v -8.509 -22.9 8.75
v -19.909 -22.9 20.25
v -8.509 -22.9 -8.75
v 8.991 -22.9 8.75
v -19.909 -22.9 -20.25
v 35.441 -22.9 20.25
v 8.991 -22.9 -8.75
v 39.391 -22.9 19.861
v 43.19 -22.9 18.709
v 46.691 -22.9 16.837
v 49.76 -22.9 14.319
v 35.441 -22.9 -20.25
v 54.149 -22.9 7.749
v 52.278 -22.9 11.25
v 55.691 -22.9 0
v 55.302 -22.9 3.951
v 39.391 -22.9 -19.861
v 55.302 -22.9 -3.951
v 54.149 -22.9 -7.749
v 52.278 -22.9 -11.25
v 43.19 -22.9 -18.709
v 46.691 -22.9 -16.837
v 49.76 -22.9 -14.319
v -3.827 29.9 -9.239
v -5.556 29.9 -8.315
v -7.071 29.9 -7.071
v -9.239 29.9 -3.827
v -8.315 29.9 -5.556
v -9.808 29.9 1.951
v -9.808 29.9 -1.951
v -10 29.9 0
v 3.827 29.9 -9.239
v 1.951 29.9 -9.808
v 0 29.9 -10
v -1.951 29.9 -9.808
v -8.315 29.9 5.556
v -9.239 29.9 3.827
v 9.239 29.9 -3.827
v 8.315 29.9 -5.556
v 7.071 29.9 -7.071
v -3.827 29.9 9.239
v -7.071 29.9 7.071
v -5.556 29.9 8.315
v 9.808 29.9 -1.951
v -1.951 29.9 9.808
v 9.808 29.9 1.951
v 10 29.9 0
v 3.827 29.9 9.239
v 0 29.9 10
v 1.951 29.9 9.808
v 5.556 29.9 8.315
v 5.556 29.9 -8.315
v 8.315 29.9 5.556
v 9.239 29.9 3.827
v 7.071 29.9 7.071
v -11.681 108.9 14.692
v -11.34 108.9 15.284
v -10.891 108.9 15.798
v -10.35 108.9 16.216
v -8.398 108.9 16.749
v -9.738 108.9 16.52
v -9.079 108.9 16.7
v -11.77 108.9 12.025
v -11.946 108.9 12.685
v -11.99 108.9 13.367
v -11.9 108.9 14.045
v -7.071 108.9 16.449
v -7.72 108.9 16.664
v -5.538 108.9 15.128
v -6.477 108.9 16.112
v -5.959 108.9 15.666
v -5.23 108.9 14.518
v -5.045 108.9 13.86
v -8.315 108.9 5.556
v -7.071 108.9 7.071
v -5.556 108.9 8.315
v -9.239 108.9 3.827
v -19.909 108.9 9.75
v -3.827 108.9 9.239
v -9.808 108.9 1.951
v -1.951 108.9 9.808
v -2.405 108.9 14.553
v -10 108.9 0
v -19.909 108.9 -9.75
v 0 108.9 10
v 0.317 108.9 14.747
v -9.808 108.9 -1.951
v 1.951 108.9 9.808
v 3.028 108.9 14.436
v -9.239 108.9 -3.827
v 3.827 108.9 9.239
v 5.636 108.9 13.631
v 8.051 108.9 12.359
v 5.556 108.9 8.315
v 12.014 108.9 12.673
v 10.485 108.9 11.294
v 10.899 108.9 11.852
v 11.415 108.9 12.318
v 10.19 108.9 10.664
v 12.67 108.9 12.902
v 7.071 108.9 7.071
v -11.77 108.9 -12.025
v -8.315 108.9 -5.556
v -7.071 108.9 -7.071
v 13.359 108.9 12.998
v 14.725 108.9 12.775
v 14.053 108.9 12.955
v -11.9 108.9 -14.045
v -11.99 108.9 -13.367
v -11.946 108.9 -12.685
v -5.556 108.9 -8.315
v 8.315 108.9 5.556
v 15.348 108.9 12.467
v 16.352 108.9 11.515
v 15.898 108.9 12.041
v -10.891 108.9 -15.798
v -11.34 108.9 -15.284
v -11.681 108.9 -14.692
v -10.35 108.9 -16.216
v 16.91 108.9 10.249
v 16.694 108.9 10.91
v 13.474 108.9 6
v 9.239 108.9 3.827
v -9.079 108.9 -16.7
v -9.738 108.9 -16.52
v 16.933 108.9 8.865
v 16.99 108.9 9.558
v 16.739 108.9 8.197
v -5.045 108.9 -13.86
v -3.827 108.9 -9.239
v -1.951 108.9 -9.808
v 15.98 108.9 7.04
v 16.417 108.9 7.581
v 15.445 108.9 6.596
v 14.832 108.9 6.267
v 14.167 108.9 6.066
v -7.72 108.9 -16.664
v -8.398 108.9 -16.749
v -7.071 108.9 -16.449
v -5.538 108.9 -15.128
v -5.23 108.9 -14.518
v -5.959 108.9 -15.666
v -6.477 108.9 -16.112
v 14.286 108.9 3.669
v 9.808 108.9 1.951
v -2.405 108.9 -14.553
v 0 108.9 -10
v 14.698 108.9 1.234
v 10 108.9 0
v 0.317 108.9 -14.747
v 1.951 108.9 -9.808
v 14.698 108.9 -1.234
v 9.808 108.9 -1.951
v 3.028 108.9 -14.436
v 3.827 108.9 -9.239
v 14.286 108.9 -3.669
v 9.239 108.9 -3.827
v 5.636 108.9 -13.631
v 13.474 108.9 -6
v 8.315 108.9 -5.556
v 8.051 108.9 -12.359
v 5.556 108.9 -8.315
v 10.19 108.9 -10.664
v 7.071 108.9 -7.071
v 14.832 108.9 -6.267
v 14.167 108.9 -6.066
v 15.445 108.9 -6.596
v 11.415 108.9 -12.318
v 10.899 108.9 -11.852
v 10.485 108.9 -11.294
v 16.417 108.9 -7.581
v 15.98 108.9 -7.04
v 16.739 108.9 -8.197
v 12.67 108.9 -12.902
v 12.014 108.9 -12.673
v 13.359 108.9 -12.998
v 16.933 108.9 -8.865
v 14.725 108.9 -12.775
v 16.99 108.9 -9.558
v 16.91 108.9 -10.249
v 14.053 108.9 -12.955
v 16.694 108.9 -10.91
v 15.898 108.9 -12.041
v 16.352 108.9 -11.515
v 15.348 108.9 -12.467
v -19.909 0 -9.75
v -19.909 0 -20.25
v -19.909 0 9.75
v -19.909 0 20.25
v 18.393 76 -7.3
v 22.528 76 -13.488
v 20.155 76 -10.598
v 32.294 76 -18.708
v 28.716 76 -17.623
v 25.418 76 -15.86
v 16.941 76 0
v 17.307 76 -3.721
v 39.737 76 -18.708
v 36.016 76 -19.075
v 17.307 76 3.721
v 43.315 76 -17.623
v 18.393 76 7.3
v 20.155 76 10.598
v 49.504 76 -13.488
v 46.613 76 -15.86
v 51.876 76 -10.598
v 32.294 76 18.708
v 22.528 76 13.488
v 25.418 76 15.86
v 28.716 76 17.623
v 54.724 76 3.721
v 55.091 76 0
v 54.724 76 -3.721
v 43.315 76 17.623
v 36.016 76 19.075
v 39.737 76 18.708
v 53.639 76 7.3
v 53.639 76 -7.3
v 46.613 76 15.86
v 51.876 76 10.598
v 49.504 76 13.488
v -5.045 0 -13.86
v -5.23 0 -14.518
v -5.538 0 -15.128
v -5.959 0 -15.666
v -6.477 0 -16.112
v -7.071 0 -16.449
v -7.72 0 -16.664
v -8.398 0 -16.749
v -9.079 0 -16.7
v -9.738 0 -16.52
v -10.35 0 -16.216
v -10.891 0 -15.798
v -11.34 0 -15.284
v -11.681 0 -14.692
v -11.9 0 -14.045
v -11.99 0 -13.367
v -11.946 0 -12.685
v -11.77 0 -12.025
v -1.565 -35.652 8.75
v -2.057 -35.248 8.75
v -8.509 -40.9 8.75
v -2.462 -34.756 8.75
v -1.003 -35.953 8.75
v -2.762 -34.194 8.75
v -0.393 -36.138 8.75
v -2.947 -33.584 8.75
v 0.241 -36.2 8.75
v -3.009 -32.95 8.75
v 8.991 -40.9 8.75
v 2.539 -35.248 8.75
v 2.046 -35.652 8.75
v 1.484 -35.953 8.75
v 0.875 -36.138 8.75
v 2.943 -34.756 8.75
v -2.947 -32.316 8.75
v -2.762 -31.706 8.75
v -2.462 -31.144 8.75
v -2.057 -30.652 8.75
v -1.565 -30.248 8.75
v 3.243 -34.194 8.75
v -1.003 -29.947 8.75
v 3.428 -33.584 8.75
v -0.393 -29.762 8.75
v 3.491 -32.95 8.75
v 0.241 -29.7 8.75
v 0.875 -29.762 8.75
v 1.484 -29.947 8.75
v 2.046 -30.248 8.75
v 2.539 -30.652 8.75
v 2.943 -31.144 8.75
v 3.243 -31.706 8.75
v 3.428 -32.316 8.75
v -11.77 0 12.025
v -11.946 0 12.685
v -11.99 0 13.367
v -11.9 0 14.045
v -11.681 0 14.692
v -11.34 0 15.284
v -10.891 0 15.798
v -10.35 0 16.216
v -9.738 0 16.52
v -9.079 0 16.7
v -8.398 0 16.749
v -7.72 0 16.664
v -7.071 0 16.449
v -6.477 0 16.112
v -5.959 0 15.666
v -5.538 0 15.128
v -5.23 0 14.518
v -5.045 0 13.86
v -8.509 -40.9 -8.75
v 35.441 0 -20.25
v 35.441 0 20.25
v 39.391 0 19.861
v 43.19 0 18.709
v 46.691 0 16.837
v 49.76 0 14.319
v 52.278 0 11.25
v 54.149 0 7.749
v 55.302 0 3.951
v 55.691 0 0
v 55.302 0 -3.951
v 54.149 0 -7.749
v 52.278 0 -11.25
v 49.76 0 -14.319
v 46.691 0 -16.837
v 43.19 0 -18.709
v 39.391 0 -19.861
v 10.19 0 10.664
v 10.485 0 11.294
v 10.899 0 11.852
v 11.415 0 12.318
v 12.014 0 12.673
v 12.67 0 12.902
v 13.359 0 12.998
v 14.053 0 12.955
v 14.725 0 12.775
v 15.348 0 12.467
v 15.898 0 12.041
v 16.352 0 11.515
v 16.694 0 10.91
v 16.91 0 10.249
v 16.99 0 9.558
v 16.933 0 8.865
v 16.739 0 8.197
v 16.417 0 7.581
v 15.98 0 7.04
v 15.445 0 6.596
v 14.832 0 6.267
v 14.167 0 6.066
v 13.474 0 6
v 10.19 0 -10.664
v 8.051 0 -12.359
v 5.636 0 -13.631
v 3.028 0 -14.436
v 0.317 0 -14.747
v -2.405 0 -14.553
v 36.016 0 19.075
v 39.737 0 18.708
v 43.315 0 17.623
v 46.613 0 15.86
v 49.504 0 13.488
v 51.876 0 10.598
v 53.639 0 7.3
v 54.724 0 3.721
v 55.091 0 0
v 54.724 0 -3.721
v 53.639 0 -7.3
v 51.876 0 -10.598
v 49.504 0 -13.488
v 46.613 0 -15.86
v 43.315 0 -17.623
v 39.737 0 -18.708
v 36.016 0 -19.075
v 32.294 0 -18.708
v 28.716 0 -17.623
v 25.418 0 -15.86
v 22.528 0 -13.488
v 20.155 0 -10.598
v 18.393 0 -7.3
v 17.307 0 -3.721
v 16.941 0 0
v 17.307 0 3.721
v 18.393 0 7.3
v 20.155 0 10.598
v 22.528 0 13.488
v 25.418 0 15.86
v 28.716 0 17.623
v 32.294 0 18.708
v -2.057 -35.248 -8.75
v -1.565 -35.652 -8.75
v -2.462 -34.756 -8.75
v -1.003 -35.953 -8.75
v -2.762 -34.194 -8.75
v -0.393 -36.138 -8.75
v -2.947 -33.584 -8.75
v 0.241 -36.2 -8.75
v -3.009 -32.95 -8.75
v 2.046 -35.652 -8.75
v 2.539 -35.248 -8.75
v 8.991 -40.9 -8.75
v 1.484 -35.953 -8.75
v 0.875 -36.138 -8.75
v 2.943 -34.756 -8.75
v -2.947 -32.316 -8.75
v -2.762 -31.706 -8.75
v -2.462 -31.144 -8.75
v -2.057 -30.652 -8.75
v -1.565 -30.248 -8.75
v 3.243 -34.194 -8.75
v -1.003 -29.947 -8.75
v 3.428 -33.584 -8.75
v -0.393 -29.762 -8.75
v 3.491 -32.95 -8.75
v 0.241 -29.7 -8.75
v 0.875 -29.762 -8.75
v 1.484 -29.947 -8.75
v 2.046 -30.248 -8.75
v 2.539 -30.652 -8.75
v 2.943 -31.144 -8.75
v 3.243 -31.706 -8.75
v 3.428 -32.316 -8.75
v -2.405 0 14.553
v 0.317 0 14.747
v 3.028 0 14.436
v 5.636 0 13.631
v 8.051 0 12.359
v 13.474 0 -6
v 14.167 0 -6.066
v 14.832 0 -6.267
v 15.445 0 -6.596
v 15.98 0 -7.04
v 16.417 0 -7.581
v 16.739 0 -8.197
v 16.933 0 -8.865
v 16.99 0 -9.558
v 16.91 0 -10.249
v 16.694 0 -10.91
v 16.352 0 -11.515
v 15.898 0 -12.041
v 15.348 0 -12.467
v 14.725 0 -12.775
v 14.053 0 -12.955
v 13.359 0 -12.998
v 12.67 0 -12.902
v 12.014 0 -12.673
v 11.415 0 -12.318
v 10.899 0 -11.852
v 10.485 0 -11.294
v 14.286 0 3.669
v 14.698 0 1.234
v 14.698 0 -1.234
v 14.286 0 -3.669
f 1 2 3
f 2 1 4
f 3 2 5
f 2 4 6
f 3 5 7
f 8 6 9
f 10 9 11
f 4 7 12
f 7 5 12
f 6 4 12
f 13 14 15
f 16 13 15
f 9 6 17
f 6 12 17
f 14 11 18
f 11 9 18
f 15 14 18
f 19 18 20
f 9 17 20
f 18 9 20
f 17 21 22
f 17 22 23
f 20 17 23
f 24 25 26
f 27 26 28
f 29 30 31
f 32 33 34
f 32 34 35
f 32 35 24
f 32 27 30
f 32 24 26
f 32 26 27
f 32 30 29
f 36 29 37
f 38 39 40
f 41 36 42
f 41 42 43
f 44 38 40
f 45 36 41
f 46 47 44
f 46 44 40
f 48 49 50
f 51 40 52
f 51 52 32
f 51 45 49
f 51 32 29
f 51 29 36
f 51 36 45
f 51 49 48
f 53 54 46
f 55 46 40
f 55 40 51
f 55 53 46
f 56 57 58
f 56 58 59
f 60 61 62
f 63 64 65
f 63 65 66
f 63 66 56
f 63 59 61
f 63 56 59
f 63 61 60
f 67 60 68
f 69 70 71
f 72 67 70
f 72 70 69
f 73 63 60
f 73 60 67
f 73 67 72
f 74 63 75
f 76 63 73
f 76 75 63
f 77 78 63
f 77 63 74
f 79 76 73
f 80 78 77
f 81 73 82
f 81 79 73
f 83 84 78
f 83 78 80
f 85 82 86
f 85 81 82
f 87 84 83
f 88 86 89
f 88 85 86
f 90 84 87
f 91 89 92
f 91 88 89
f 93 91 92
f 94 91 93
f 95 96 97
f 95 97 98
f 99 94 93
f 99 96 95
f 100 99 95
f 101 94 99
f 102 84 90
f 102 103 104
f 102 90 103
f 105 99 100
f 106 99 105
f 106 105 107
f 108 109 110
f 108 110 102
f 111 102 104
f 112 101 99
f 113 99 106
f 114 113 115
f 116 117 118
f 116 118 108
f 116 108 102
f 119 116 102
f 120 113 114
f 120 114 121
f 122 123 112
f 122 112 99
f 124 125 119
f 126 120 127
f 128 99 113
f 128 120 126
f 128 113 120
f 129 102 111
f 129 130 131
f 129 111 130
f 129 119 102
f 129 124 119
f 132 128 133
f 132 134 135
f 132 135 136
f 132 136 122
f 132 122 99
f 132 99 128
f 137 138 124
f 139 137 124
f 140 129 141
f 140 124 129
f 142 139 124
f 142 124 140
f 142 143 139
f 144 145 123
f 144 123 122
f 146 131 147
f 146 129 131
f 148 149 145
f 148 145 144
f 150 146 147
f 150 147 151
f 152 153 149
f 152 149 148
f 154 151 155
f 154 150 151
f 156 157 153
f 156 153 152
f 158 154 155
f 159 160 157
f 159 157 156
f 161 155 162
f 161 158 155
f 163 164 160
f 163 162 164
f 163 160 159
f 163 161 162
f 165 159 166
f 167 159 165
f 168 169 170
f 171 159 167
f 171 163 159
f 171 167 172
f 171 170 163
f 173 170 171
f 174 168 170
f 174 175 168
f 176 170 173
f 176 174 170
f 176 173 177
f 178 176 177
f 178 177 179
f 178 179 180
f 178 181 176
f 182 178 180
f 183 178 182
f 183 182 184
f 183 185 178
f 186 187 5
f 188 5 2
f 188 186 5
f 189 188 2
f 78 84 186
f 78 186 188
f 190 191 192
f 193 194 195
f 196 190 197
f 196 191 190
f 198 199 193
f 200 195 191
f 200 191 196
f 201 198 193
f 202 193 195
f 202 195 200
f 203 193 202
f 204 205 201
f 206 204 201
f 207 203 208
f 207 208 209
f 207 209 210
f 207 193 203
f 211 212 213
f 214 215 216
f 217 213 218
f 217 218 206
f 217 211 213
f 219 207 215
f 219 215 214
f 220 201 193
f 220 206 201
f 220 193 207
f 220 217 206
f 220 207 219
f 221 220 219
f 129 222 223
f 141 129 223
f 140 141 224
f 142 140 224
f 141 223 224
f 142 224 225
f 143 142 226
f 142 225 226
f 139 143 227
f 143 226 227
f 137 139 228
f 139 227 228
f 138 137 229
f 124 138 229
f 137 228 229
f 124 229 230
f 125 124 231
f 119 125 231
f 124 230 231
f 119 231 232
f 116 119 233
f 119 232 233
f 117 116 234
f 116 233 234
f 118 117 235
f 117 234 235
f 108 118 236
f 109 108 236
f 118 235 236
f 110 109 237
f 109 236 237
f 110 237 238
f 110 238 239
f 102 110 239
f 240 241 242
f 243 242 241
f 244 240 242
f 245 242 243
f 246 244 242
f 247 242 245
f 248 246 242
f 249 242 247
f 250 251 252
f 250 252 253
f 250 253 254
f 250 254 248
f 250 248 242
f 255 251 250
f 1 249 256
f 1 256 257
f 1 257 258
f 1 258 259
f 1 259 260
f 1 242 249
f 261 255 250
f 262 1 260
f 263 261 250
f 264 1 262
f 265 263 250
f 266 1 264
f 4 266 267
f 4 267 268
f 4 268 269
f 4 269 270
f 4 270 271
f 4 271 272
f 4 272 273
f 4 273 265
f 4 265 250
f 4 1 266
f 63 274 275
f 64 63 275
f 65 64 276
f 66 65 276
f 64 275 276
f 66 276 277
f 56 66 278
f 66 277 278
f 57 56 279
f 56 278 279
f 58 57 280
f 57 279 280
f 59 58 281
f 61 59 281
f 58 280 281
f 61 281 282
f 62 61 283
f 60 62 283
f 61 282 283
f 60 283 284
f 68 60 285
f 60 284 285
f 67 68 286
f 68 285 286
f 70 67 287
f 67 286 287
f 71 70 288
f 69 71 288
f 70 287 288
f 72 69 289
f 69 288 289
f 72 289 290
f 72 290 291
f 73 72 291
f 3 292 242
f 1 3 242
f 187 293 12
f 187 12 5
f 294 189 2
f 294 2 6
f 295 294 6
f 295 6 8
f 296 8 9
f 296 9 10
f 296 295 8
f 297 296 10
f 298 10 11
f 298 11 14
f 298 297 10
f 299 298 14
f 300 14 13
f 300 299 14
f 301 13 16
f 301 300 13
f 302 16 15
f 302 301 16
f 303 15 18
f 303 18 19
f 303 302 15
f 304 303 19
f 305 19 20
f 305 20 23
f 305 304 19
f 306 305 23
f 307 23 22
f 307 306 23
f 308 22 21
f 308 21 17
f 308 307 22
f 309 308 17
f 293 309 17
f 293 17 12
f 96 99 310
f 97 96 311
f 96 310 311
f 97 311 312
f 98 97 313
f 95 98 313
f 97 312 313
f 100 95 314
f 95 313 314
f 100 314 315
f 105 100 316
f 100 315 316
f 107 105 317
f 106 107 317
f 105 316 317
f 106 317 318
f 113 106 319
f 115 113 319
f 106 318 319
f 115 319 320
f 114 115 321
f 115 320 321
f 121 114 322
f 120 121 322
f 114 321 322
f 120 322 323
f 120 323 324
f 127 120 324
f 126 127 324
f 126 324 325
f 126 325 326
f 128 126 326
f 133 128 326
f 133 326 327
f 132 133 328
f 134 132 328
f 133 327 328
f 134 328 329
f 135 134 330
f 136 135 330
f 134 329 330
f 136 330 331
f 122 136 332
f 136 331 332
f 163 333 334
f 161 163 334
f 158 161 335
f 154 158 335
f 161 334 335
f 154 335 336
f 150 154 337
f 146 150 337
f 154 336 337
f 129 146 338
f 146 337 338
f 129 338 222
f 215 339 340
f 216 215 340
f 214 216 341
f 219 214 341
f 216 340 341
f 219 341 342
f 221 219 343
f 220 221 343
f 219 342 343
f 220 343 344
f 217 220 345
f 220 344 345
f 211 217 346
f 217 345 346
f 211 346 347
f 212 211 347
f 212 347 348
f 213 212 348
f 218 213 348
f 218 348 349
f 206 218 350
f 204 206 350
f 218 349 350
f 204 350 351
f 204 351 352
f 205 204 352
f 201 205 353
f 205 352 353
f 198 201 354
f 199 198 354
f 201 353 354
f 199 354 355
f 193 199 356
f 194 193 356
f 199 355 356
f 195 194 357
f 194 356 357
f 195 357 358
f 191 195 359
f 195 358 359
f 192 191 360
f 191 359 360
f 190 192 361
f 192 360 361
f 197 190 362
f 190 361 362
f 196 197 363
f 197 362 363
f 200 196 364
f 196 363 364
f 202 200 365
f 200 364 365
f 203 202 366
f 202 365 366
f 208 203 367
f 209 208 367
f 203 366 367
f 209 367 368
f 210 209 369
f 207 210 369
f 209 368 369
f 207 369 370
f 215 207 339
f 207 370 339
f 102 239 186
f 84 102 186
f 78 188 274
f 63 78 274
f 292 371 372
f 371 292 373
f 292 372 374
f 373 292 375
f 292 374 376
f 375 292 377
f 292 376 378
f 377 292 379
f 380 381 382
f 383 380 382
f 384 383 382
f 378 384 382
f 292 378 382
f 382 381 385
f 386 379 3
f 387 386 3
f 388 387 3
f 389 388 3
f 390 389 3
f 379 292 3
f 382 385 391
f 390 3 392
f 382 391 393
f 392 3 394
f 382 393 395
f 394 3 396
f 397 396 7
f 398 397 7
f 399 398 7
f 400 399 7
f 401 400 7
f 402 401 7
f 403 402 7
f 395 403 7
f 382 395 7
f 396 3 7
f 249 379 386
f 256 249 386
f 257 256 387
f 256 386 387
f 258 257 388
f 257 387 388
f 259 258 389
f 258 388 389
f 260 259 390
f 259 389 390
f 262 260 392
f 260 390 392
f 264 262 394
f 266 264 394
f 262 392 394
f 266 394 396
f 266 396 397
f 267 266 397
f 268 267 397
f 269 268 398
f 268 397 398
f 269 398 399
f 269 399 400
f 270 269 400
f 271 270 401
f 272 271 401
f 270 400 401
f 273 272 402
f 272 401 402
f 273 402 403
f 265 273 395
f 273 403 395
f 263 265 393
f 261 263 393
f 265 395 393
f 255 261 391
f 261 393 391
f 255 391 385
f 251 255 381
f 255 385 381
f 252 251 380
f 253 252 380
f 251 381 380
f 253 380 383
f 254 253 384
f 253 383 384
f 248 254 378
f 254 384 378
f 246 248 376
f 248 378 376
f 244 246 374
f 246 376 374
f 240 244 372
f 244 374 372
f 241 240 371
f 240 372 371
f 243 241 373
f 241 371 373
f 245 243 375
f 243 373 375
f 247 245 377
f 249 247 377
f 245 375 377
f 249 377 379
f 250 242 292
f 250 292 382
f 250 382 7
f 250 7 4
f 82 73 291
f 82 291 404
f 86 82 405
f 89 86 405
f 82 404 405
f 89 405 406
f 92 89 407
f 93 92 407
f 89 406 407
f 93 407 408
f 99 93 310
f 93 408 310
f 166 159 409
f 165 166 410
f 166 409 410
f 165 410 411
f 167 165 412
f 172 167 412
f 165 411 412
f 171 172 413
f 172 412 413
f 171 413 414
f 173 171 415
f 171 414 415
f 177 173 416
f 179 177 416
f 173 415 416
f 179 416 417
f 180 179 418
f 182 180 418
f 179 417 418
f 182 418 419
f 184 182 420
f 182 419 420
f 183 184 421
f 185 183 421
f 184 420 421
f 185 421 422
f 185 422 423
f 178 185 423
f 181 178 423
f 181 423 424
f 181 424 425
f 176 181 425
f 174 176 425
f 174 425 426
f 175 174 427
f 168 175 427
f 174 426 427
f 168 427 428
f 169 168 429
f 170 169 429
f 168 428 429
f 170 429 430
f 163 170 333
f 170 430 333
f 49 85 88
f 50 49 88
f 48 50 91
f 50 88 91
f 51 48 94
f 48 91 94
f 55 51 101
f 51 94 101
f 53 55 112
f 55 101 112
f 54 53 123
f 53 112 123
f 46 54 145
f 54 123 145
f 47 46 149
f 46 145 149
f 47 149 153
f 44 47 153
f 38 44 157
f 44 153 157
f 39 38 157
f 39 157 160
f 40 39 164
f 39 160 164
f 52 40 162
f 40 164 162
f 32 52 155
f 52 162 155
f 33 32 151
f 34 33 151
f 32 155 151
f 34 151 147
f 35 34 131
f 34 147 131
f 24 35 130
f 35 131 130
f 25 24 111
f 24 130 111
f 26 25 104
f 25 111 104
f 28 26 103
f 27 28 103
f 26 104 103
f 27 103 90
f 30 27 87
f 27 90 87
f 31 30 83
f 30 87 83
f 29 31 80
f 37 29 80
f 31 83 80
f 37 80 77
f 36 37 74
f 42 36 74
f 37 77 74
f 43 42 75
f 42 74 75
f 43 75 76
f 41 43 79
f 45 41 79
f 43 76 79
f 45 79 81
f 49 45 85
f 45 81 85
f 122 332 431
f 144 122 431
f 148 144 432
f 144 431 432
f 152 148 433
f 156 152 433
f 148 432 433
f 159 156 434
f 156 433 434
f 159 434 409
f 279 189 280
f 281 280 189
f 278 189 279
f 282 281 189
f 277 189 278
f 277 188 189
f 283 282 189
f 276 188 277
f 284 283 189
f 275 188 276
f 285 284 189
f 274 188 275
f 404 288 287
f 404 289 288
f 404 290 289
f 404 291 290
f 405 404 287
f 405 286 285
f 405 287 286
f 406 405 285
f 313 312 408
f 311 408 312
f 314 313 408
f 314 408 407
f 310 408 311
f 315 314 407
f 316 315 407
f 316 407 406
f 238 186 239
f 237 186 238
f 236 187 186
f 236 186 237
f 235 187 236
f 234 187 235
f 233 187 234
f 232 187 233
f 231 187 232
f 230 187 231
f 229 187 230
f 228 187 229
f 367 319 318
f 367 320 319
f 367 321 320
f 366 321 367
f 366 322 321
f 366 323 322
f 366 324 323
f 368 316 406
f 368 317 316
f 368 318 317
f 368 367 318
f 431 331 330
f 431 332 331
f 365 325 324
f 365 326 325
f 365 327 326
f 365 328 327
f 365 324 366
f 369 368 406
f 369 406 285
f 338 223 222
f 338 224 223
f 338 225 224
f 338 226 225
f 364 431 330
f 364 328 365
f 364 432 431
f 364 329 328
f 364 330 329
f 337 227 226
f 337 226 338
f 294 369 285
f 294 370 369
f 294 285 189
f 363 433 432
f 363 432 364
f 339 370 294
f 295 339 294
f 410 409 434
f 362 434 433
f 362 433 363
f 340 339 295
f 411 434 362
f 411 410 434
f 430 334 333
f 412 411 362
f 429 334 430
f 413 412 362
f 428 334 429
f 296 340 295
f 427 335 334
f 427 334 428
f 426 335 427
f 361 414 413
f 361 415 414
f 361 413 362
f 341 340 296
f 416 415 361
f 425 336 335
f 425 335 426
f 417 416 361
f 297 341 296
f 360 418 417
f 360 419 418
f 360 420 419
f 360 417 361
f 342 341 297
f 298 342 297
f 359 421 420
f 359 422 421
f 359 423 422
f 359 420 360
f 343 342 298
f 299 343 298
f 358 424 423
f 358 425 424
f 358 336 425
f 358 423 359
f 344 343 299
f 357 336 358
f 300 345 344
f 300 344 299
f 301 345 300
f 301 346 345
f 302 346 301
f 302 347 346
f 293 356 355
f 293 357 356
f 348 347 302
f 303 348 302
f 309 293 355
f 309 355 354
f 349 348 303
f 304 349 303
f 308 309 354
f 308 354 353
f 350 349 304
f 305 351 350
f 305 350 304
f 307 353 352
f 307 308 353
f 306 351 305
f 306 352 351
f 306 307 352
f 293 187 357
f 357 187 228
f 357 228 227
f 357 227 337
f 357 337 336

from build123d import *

# Parameters (mm, degrees)
BOSS_EXTRUDE1_DEPTH = 108.9
SKETCH2_R           = 19.075
BOSS_EXTRUDE2_DEPTH = 76
BOSS_EXTRUDE3_DEPTH = 22.9
SKETCH4_W           = 17.5
SKETCH4_H           = 17.5
BOSS_EXTRUDE4_DEPTH = 18
SKETCH5_R           = 3.25
CUT_EXTRUDE1_DEPTH  = 17.5
SKETCH6_R           = 10
CUT_EXTRUDE2_DEPTH  = 79


with BuildPart() as part:
    # Sketch1 → Boss-Extrude1 (new body)
    with BuildSketch(Plane(origin=(0, 0, 0), x_dir=(1, 0, 0), z_dir=(0, 1, 0))):
        with BuildLine():
            ThreePointArc((10.190041387, 10.664218515), (3.028324854, 14.435780151), (-5.045314834, 13.860277711))
            ThreePointArc((-5.045314834, 13.860277711), (-9.413082328, 16.626544393), (-11.770381199, 12.025156963))
            Line((-11.770381199, 12.025156963), (-19.909262437, 9.75))
            Line((-19.909262437, 9.75), (-19.909262437, -9.75))
            Line((-19.909262437, -9.75), (-11.770381199, -12.025156963))
            ThreePointArc((-11.770381199, -12.025156963), (-9.413082328, -16.626544393), (-5.045314834, -13.860277711))
            ThreePointArc((-5.045314834, -13.860277711), (3.028324854, -14.435780151), (10.190041387, -10.664218515))
            ThreePointArc((10.190041387, -10.664218515), (16.352409168, -11.515151515), (13.474496198, -6.000037683))
            ThreePointArc((13.474496198, -6.000037683), (14.75, 0), (13.474496198, 6.000037683))
            ThreePointArc((13.474496198, 6.000037683), (16.352409168, 11.515151515), (10.190041387, 10.664218515))
        make_face()
    extrude(amount=BOSS_EXTRUDE1_DEPTH)



with BuildPart() as body_2:
    # Sketch2 → Boss-Extrude2 (new body)
    with BuildSketch(Plane(origin=(0, 0, 0), x_dir=(1, 0, 0), z_dir=(0, 1, 0))):
        with Locations(Location((36.015737563, 0, 0), (0, 0, 270))):
            Circle(SKETCH2_R)
    extrude(amount=BOSS_EXTRUDE2_DEPTH)


with BuildPart() as part_1:
    add(part.part)

    add(body_2.part)  # Boss-Extrude3 merges body 2
    # Sketch3 → Boss-Extrude3 (add)
    with BuildSketch(Plane(origin=(0, 0, 0), x_dir=(1, 0, 0), z_dir=(0, 1, 0))):
        with BuildLine():
            Line((-19.909262437, 20.25), (-19.909262437, -20.25))
            Line((-19.909262437, -20.25), (35.440737563, -20.25))
            ThreePointArc((35.440737563, -20.25), (55.690737563, 0), (35.440737563, 20.25))
            Line((35.440737563, 20.25), (-19.909262437, 20.25))
        make_face()
    extrude(amount=-BOSS_EXTRUDE3_DEPTH)

    # Sketch4 → Boss-Extrude4 (add)
    with BuildSketch(Plane.XZ.offset(22.9)):
        with Locations((0.240737563, 0)):
            Rectangle(SKETCH4_W, SKETCH4_H)
    extrude(amount=BOSS_EXTRUDE4_DEPTH)

    # Sketch5 → Cut-Extrude1 (cut)
    with BuildSketch(Plane(origin=(0, 0, -8.75), x_dir=(-1, 0, 0), z_dir=(0, 0, -1))):
        with Locations((-0.240737563, -32.95)):
            Circle(SKETCH5_R)
    extrude(amount=-CUT_EXTRUDE1_DEPTH, mode=Mode.SUBTRACT)

    # Sketch6 → Cut-Extrude2 (cut)
    with BuildSketch(Plane(origin=(0, 108.9, 0), x_dir=(1, 0, 0), z_dir=(0, 1, 0))):
        with Locations(Location((0, 0, 0), (0, 0, 270))):
            Circle(SKETCH6_R)
    extrude(amount=-CUT_EXTRUDE2_DEPTH, mode=Mode.SUBTRACT)


solid = part_1.part
